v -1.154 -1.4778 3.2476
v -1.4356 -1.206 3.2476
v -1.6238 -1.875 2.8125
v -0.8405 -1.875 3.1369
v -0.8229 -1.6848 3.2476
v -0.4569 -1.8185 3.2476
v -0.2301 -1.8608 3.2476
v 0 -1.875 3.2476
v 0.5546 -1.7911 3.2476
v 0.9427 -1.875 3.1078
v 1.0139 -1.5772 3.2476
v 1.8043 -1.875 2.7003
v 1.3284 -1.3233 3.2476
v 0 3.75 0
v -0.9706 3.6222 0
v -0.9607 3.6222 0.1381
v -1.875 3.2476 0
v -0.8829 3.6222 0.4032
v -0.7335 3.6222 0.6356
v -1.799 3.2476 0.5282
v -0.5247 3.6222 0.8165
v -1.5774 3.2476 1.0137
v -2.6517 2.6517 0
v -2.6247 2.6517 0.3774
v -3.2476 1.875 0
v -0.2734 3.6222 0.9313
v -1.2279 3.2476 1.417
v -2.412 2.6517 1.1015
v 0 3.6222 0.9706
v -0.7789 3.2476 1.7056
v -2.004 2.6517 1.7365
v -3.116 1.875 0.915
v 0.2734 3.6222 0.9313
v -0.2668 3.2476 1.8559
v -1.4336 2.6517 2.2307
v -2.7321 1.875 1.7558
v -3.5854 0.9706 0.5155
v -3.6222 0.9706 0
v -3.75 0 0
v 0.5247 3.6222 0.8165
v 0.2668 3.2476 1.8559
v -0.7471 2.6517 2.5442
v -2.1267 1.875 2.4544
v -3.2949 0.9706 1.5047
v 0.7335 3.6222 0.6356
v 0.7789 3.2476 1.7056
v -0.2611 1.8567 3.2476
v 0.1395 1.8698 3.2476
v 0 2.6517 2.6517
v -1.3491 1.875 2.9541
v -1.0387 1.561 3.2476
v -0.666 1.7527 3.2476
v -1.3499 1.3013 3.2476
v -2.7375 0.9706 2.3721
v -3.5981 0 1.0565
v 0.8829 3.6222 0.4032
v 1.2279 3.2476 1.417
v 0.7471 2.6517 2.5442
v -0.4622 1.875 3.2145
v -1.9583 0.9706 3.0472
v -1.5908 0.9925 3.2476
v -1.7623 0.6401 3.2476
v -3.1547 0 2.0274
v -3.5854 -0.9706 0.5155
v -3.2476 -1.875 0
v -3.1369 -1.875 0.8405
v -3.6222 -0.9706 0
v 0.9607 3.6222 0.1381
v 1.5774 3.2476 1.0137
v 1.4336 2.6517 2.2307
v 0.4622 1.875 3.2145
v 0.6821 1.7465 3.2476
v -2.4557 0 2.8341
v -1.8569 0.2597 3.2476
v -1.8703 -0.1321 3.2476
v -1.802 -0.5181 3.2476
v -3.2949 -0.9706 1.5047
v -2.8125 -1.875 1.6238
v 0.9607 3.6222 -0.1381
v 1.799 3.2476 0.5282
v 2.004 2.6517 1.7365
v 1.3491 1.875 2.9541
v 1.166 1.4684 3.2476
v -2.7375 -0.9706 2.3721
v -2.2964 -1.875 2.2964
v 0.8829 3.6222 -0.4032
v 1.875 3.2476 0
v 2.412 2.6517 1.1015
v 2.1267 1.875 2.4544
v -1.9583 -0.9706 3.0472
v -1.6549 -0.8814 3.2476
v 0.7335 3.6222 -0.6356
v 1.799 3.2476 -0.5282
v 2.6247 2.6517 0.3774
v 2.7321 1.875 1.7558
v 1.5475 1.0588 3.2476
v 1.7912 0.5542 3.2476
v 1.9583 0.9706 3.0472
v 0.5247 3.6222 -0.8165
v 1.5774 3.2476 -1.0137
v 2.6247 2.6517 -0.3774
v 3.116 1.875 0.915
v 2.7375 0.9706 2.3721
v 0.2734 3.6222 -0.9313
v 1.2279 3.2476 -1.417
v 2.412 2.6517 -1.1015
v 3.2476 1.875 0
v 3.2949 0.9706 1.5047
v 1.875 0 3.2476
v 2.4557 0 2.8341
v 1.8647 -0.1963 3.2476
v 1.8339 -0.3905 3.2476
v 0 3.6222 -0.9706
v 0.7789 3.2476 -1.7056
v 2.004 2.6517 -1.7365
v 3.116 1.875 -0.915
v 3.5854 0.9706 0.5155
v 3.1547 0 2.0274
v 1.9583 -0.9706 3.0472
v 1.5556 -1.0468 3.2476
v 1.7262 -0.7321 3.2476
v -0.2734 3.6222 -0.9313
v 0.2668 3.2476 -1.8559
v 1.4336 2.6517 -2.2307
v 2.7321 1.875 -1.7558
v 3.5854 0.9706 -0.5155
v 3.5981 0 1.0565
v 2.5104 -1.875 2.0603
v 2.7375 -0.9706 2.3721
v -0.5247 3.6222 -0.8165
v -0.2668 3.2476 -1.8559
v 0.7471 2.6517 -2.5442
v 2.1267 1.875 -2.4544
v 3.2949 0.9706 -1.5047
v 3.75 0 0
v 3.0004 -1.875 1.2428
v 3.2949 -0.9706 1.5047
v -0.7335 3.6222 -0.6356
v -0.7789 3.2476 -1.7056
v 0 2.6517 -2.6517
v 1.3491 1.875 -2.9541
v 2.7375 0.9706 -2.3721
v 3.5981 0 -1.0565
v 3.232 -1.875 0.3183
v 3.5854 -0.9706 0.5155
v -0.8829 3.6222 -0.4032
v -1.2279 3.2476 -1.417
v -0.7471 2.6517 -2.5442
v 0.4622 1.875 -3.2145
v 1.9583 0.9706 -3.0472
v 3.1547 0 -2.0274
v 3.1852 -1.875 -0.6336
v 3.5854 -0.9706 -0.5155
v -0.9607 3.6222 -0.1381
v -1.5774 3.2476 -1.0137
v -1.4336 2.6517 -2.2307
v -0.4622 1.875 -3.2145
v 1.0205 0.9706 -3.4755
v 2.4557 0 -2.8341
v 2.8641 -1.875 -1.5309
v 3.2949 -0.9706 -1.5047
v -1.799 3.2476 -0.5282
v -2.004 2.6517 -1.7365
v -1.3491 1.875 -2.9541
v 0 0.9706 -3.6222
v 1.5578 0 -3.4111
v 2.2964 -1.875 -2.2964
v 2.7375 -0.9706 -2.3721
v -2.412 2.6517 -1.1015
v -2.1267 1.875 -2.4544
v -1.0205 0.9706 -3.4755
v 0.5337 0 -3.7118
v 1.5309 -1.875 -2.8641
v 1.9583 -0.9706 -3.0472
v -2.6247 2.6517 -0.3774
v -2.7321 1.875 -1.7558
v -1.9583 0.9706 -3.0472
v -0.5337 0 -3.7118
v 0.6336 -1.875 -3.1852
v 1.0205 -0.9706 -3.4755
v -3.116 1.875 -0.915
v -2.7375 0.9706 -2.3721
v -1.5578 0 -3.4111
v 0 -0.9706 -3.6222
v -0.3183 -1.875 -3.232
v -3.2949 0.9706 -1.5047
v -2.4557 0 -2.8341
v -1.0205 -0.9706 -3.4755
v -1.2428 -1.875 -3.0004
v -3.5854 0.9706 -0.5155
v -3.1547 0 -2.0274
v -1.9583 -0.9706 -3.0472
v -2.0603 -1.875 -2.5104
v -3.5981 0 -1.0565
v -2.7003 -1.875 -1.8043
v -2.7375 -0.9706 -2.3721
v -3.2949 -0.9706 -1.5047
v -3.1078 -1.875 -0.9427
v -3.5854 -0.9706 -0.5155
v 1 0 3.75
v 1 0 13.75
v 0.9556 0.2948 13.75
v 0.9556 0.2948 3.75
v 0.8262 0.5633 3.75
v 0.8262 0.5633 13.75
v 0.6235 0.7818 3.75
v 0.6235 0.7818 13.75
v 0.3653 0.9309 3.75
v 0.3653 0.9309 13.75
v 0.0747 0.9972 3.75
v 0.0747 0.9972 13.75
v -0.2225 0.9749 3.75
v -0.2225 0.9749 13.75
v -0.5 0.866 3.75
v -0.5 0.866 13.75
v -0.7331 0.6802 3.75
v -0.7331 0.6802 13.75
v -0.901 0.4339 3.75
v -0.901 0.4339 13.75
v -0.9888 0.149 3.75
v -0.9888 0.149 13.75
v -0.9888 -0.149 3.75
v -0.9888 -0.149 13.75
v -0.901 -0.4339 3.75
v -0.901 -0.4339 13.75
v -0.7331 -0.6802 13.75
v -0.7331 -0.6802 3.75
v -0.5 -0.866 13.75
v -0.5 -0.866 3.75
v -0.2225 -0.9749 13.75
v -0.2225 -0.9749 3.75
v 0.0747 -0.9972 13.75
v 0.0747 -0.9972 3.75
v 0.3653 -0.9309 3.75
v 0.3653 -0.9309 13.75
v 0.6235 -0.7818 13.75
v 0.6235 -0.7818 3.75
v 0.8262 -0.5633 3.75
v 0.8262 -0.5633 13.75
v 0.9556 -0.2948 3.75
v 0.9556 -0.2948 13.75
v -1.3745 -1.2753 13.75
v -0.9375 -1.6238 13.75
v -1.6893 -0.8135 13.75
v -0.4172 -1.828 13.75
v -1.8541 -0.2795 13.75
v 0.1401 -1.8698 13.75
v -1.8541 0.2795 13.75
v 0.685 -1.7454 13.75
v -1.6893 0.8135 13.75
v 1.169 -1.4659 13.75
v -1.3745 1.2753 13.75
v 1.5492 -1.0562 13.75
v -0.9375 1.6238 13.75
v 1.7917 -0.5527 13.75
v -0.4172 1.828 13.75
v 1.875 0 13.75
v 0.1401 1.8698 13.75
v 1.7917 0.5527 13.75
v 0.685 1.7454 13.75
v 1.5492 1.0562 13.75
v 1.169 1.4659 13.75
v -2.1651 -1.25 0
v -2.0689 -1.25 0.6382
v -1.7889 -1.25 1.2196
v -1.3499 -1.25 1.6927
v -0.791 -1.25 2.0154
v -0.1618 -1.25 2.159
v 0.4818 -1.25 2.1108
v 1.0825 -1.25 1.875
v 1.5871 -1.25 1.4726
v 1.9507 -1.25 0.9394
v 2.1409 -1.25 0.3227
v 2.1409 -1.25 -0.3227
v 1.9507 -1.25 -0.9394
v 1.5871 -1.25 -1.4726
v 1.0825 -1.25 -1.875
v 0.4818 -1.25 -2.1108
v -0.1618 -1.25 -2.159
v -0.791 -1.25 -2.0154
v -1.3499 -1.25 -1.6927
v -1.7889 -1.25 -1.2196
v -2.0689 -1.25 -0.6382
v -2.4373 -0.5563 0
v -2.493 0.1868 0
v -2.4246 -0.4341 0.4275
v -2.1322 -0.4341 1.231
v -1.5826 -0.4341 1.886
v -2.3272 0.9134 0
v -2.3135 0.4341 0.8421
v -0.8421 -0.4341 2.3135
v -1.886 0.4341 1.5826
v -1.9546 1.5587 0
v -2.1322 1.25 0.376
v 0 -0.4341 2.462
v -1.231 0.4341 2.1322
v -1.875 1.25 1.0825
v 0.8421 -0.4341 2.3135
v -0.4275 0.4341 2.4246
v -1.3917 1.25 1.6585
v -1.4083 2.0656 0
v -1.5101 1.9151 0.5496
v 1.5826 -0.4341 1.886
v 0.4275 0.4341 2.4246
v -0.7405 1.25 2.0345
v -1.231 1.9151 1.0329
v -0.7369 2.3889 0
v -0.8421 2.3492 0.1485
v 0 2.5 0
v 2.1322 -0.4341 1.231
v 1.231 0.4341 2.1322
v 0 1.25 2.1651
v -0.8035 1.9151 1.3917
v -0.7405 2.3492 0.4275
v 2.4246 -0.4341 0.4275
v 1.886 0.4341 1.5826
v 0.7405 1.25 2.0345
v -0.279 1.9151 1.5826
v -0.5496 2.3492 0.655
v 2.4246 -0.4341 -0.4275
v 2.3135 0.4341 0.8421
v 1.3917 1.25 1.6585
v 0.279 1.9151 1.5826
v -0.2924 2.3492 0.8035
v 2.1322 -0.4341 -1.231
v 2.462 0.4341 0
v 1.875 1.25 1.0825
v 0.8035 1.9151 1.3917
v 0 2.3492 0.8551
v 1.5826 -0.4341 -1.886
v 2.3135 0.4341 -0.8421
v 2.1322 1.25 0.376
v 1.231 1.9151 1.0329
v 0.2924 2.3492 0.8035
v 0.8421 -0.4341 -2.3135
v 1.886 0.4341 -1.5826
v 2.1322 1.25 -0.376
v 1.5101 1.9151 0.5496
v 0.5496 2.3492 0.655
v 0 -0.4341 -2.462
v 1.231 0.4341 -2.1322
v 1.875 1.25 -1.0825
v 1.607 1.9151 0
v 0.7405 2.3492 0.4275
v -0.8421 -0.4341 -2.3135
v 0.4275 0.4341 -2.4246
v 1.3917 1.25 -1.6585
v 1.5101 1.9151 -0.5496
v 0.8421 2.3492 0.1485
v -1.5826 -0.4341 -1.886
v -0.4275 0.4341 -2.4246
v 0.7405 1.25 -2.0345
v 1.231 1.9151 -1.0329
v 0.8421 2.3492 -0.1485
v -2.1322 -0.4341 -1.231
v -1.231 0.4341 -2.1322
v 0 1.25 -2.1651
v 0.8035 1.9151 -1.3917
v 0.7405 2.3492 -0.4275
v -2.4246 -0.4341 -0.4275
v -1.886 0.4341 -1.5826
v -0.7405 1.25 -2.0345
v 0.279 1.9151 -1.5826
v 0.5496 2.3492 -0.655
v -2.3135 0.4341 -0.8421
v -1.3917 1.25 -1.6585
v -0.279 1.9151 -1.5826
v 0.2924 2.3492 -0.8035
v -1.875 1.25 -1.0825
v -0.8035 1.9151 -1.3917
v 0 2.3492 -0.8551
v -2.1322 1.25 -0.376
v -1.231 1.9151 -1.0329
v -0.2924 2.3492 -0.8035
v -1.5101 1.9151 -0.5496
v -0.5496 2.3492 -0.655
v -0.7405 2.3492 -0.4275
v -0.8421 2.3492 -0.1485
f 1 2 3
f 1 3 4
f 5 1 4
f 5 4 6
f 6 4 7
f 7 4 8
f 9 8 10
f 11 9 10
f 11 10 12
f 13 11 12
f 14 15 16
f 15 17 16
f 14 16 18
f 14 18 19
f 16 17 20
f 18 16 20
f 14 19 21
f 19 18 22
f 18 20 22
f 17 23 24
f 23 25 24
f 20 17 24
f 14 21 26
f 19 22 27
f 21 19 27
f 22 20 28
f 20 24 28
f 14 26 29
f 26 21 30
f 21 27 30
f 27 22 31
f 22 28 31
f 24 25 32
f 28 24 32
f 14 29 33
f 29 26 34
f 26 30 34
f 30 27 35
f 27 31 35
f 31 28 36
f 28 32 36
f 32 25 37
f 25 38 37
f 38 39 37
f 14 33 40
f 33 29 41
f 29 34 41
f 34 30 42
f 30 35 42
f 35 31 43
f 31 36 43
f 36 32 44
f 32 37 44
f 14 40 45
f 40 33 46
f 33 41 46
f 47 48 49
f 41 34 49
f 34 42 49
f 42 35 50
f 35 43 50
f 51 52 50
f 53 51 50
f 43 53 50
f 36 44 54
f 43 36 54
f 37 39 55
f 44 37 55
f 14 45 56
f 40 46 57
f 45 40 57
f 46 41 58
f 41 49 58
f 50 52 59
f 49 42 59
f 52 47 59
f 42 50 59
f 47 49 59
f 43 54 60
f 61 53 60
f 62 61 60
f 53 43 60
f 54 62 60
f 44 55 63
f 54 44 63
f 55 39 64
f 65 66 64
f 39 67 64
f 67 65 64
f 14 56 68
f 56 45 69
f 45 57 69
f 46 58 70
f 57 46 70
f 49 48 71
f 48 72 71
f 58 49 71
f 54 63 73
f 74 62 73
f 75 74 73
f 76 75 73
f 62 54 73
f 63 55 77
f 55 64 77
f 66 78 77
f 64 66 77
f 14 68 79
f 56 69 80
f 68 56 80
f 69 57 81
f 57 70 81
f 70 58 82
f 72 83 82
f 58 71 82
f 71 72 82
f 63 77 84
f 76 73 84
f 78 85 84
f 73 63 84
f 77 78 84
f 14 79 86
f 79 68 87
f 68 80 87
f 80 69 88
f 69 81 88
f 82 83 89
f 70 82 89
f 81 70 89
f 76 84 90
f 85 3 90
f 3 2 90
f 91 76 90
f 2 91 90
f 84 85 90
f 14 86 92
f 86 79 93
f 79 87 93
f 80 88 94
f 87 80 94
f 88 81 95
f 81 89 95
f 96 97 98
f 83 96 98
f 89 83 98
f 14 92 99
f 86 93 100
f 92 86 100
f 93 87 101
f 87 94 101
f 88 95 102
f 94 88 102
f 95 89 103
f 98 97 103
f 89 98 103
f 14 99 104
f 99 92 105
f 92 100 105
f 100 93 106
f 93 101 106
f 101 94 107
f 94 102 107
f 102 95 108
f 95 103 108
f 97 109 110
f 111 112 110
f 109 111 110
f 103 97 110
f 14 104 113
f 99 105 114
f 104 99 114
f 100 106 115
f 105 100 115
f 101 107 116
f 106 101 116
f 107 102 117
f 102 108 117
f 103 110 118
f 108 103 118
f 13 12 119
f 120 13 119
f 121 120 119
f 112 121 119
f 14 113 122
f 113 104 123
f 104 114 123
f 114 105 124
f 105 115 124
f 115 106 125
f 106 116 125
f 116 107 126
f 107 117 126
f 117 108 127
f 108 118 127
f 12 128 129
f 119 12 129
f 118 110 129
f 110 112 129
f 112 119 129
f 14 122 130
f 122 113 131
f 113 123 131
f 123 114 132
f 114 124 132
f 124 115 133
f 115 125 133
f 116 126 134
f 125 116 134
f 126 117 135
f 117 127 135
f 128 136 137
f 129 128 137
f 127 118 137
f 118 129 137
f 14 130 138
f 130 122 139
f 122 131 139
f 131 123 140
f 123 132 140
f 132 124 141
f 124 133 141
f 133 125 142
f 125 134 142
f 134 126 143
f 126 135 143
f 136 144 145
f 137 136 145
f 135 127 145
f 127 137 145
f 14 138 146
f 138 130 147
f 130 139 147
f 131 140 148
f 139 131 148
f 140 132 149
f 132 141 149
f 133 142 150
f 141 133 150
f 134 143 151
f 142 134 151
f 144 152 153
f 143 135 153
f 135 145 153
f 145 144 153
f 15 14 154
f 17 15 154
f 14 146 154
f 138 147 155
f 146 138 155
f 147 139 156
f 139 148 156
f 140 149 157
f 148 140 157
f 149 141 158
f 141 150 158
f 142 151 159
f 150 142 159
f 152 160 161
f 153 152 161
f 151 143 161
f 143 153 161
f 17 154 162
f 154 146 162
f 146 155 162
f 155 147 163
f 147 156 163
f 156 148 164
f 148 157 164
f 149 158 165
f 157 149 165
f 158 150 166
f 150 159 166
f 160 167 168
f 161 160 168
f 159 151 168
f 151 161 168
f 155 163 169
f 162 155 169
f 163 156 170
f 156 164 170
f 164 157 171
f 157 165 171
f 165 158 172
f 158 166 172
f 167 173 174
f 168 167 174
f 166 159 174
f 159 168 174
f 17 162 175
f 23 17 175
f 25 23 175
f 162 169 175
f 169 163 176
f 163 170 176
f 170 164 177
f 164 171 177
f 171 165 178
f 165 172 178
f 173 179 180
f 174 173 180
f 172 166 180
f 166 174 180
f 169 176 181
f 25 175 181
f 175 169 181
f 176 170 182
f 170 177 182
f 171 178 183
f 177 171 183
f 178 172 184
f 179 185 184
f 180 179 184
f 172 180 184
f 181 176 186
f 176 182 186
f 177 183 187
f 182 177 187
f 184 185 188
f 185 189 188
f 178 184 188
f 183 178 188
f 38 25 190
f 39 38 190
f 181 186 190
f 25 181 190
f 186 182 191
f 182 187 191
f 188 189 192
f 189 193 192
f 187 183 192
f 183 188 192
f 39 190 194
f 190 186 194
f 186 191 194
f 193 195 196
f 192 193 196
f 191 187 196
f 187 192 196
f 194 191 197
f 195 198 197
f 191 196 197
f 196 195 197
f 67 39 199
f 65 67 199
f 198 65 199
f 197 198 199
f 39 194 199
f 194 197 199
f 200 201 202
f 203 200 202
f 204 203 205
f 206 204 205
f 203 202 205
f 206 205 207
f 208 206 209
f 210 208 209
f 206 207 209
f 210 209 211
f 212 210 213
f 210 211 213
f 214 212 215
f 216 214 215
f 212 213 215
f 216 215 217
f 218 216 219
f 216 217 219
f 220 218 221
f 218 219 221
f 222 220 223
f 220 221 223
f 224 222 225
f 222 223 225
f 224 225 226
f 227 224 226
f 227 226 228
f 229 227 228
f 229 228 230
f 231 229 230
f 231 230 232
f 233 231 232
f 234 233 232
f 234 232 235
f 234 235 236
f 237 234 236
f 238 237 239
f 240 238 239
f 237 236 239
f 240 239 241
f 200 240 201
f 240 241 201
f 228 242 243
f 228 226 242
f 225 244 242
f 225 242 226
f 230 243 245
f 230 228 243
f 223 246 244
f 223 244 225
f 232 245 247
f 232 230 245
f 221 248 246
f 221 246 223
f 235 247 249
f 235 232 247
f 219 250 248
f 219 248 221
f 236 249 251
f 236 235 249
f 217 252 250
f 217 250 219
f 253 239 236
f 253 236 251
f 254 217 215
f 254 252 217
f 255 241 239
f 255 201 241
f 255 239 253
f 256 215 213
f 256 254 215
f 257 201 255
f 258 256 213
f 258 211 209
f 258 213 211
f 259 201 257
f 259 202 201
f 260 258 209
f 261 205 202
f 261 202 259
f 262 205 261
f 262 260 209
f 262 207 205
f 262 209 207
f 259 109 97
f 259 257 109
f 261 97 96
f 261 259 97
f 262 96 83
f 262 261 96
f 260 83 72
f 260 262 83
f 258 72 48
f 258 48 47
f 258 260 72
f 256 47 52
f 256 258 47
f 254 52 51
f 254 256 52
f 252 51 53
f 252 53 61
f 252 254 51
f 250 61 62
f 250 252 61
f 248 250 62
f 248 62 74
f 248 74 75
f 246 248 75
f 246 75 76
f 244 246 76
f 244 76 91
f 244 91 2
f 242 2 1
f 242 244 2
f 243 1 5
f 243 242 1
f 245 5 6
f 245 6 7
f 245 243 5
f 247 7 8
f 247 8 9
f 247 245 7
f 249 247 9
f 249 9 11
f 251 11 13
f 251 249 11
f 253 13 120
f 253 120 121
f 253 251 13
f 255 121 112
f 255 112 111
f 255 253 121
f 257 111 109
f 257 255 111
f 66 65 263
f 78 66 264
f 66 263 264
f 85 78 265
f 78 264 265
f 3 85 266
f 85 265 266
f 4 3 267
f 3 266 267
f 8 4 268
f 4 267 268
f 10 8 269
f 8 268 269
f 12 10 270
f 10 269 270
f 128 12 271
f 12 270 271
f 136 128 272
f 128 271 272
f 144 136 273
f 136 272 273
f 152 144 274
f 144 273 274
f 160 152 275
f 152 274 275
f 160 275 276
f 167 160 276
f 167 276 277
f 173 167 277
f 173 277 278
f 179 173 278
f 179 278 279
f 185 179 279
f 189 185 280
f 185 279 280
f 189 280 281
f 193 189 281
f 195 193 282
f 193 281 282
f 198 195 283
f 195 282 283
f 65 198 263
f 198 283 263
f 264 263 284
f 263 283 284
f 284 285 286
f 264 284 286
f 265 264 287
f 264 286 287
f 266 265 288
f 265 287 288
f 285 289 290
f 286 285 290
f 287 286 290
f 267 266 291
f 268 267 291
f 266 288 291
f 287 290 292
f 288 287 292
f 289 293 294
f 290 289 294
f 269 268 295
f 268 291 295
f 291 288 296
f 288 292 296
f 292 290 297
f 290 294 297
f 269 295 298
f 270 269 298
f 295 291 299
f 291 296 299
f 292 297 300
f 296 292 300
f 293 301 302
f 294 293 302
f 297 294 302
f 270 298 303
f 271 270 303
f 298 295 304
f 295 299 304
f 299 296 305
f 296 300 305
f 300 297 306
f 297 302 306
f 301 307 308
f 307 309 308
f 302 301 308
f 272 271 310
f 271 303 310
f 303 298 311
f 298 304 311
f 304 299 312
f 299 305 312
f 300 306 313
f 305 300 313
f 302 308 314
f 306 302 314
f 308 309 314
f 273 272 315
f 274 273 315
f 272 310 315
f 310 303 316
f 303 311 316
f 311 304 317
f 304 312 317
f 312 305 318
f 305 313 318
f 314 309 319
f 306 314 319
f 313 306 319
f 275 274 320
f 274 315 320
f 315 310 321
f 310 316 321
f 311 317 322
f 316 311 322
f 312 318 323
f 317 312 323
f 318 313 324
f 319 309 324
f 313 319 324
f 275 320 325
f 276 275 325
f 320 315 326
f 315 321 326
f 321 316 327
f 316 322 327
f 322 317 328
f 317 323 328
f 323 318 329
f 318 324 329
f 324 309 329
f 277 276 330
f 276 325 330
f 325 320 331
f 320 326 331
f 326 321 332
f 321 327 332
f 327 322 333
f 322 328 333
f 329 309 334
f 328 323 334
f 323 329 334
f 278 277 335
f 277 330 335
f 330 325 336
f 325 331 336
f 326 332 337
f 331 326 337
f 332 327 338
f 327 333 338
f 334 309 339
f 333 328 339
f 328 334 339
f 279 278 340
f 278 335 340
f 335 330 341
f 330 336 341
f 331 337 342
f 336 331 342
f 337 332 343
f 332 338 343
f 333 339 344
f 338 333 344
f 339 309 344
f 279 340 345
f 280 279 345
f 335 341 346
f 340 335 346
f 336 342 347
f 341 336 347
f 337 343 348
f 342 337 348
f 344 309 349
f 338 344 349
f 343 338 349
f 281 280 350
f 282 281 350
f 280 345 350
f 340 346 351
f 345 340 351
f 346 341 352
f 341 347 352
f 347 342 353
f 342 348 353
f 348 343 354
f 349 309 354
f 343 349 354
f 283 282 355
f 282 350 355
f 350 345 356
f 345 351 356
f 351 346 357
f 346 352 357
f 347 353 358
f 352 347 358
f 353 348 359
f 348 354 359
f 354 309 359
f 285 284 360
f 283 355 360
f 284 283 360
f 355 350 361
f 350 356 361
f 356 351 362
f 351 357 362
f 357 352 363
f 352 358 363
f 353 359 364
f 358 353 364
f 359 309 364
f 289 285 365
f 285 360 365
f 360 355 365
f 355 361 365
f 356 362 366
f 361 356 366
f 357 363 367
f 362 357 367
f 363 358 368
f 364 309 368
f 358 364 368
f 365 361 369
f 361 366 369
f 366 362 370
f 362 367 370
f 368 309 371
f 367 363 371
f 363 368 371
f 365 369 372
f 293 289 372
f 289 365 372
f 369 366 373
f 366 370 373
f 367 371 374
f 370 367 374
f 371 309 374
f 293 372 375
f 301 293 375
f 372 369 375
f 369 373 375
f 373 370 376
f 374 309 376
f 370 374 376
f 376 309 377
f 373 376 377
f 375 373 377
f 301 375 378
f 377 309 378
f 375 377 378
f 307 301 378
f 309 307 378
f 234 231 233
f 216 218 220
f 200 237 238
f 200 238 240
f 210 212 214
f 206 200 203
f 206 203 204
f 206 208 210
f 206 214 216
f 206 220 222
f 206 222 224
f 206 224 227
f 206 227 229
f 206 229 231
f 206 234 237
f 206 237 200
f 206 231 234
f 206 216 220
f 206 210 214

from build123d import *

# Parameters (mm, degrees)
SKETCH2_R                       = 1.875
BOSS_EXTRUDE1_DEPTH             = 10
BOSS_EXTRUDE1_DIRECTION_2_REACH = 9.5
SKETCH5_R                       = 1
CUT_EXTRUDE1_DEPTH              = 10


with BuildPart() as part:
    # Sketch1 → Revolve1 (revolve)
    with BuildSketch(Plane.XY):
        with BuildLine():
            Line((-3.247595264, -1.875), (-2.165063509, -1.25))
            ThreePointArc((-2.165063509, -1.25), (-2.165063509, 1.25), (0, 2.5))
            Line((0, 2.5), (0, 3.75))
            ThreePointArc((0, 3.75), (-3.247595264, 1.875), (-3.247595264, -1.875))
        make_face()
    revolve(axis=Axis((0, 2.5, 0), (0, 1, 0)))

    # Sketch2 → Boss-Extrude1 (add)
    with BuildSketch(Plane.XY.offset(3.75)):
        Circle(SKETCH2_R)
    extrude(amount=BOSS_EXTRUDE1_DEPTH)

    # Sketch2 → Boss-Extrude1 direction 2 (add, up to next)
    with BuildSketch(Plane.XY.offset(3.75), mode=Mode.PRIVATE) as boss_extrude1_direction_2_sk1:
        Circle(SKETCH2_R)
    boss_extrude1_direction_2_tool1 = extrude(boss_extrude1_direction_2_sk1.sketch, amount=-BOSS_EXTRUDE1_DIRECTION_2_REACH, mode=Mode.PRIVATE) - part.part
    add(boss_extrude1_direction_2_tool1.solids().sort_by_distance((0, 0, 3.75))[0])

    # Sketch5 → Cut-Extrude1 (cut)
    with BuildSketch(Plane.XY.offset(13.75)):
        Circle(SKETCH5_R)
    extrude(amount=-CUT_EXTRUDE1_DEPTH, mode=Mode.SUBTRACT)


solid = part.part
